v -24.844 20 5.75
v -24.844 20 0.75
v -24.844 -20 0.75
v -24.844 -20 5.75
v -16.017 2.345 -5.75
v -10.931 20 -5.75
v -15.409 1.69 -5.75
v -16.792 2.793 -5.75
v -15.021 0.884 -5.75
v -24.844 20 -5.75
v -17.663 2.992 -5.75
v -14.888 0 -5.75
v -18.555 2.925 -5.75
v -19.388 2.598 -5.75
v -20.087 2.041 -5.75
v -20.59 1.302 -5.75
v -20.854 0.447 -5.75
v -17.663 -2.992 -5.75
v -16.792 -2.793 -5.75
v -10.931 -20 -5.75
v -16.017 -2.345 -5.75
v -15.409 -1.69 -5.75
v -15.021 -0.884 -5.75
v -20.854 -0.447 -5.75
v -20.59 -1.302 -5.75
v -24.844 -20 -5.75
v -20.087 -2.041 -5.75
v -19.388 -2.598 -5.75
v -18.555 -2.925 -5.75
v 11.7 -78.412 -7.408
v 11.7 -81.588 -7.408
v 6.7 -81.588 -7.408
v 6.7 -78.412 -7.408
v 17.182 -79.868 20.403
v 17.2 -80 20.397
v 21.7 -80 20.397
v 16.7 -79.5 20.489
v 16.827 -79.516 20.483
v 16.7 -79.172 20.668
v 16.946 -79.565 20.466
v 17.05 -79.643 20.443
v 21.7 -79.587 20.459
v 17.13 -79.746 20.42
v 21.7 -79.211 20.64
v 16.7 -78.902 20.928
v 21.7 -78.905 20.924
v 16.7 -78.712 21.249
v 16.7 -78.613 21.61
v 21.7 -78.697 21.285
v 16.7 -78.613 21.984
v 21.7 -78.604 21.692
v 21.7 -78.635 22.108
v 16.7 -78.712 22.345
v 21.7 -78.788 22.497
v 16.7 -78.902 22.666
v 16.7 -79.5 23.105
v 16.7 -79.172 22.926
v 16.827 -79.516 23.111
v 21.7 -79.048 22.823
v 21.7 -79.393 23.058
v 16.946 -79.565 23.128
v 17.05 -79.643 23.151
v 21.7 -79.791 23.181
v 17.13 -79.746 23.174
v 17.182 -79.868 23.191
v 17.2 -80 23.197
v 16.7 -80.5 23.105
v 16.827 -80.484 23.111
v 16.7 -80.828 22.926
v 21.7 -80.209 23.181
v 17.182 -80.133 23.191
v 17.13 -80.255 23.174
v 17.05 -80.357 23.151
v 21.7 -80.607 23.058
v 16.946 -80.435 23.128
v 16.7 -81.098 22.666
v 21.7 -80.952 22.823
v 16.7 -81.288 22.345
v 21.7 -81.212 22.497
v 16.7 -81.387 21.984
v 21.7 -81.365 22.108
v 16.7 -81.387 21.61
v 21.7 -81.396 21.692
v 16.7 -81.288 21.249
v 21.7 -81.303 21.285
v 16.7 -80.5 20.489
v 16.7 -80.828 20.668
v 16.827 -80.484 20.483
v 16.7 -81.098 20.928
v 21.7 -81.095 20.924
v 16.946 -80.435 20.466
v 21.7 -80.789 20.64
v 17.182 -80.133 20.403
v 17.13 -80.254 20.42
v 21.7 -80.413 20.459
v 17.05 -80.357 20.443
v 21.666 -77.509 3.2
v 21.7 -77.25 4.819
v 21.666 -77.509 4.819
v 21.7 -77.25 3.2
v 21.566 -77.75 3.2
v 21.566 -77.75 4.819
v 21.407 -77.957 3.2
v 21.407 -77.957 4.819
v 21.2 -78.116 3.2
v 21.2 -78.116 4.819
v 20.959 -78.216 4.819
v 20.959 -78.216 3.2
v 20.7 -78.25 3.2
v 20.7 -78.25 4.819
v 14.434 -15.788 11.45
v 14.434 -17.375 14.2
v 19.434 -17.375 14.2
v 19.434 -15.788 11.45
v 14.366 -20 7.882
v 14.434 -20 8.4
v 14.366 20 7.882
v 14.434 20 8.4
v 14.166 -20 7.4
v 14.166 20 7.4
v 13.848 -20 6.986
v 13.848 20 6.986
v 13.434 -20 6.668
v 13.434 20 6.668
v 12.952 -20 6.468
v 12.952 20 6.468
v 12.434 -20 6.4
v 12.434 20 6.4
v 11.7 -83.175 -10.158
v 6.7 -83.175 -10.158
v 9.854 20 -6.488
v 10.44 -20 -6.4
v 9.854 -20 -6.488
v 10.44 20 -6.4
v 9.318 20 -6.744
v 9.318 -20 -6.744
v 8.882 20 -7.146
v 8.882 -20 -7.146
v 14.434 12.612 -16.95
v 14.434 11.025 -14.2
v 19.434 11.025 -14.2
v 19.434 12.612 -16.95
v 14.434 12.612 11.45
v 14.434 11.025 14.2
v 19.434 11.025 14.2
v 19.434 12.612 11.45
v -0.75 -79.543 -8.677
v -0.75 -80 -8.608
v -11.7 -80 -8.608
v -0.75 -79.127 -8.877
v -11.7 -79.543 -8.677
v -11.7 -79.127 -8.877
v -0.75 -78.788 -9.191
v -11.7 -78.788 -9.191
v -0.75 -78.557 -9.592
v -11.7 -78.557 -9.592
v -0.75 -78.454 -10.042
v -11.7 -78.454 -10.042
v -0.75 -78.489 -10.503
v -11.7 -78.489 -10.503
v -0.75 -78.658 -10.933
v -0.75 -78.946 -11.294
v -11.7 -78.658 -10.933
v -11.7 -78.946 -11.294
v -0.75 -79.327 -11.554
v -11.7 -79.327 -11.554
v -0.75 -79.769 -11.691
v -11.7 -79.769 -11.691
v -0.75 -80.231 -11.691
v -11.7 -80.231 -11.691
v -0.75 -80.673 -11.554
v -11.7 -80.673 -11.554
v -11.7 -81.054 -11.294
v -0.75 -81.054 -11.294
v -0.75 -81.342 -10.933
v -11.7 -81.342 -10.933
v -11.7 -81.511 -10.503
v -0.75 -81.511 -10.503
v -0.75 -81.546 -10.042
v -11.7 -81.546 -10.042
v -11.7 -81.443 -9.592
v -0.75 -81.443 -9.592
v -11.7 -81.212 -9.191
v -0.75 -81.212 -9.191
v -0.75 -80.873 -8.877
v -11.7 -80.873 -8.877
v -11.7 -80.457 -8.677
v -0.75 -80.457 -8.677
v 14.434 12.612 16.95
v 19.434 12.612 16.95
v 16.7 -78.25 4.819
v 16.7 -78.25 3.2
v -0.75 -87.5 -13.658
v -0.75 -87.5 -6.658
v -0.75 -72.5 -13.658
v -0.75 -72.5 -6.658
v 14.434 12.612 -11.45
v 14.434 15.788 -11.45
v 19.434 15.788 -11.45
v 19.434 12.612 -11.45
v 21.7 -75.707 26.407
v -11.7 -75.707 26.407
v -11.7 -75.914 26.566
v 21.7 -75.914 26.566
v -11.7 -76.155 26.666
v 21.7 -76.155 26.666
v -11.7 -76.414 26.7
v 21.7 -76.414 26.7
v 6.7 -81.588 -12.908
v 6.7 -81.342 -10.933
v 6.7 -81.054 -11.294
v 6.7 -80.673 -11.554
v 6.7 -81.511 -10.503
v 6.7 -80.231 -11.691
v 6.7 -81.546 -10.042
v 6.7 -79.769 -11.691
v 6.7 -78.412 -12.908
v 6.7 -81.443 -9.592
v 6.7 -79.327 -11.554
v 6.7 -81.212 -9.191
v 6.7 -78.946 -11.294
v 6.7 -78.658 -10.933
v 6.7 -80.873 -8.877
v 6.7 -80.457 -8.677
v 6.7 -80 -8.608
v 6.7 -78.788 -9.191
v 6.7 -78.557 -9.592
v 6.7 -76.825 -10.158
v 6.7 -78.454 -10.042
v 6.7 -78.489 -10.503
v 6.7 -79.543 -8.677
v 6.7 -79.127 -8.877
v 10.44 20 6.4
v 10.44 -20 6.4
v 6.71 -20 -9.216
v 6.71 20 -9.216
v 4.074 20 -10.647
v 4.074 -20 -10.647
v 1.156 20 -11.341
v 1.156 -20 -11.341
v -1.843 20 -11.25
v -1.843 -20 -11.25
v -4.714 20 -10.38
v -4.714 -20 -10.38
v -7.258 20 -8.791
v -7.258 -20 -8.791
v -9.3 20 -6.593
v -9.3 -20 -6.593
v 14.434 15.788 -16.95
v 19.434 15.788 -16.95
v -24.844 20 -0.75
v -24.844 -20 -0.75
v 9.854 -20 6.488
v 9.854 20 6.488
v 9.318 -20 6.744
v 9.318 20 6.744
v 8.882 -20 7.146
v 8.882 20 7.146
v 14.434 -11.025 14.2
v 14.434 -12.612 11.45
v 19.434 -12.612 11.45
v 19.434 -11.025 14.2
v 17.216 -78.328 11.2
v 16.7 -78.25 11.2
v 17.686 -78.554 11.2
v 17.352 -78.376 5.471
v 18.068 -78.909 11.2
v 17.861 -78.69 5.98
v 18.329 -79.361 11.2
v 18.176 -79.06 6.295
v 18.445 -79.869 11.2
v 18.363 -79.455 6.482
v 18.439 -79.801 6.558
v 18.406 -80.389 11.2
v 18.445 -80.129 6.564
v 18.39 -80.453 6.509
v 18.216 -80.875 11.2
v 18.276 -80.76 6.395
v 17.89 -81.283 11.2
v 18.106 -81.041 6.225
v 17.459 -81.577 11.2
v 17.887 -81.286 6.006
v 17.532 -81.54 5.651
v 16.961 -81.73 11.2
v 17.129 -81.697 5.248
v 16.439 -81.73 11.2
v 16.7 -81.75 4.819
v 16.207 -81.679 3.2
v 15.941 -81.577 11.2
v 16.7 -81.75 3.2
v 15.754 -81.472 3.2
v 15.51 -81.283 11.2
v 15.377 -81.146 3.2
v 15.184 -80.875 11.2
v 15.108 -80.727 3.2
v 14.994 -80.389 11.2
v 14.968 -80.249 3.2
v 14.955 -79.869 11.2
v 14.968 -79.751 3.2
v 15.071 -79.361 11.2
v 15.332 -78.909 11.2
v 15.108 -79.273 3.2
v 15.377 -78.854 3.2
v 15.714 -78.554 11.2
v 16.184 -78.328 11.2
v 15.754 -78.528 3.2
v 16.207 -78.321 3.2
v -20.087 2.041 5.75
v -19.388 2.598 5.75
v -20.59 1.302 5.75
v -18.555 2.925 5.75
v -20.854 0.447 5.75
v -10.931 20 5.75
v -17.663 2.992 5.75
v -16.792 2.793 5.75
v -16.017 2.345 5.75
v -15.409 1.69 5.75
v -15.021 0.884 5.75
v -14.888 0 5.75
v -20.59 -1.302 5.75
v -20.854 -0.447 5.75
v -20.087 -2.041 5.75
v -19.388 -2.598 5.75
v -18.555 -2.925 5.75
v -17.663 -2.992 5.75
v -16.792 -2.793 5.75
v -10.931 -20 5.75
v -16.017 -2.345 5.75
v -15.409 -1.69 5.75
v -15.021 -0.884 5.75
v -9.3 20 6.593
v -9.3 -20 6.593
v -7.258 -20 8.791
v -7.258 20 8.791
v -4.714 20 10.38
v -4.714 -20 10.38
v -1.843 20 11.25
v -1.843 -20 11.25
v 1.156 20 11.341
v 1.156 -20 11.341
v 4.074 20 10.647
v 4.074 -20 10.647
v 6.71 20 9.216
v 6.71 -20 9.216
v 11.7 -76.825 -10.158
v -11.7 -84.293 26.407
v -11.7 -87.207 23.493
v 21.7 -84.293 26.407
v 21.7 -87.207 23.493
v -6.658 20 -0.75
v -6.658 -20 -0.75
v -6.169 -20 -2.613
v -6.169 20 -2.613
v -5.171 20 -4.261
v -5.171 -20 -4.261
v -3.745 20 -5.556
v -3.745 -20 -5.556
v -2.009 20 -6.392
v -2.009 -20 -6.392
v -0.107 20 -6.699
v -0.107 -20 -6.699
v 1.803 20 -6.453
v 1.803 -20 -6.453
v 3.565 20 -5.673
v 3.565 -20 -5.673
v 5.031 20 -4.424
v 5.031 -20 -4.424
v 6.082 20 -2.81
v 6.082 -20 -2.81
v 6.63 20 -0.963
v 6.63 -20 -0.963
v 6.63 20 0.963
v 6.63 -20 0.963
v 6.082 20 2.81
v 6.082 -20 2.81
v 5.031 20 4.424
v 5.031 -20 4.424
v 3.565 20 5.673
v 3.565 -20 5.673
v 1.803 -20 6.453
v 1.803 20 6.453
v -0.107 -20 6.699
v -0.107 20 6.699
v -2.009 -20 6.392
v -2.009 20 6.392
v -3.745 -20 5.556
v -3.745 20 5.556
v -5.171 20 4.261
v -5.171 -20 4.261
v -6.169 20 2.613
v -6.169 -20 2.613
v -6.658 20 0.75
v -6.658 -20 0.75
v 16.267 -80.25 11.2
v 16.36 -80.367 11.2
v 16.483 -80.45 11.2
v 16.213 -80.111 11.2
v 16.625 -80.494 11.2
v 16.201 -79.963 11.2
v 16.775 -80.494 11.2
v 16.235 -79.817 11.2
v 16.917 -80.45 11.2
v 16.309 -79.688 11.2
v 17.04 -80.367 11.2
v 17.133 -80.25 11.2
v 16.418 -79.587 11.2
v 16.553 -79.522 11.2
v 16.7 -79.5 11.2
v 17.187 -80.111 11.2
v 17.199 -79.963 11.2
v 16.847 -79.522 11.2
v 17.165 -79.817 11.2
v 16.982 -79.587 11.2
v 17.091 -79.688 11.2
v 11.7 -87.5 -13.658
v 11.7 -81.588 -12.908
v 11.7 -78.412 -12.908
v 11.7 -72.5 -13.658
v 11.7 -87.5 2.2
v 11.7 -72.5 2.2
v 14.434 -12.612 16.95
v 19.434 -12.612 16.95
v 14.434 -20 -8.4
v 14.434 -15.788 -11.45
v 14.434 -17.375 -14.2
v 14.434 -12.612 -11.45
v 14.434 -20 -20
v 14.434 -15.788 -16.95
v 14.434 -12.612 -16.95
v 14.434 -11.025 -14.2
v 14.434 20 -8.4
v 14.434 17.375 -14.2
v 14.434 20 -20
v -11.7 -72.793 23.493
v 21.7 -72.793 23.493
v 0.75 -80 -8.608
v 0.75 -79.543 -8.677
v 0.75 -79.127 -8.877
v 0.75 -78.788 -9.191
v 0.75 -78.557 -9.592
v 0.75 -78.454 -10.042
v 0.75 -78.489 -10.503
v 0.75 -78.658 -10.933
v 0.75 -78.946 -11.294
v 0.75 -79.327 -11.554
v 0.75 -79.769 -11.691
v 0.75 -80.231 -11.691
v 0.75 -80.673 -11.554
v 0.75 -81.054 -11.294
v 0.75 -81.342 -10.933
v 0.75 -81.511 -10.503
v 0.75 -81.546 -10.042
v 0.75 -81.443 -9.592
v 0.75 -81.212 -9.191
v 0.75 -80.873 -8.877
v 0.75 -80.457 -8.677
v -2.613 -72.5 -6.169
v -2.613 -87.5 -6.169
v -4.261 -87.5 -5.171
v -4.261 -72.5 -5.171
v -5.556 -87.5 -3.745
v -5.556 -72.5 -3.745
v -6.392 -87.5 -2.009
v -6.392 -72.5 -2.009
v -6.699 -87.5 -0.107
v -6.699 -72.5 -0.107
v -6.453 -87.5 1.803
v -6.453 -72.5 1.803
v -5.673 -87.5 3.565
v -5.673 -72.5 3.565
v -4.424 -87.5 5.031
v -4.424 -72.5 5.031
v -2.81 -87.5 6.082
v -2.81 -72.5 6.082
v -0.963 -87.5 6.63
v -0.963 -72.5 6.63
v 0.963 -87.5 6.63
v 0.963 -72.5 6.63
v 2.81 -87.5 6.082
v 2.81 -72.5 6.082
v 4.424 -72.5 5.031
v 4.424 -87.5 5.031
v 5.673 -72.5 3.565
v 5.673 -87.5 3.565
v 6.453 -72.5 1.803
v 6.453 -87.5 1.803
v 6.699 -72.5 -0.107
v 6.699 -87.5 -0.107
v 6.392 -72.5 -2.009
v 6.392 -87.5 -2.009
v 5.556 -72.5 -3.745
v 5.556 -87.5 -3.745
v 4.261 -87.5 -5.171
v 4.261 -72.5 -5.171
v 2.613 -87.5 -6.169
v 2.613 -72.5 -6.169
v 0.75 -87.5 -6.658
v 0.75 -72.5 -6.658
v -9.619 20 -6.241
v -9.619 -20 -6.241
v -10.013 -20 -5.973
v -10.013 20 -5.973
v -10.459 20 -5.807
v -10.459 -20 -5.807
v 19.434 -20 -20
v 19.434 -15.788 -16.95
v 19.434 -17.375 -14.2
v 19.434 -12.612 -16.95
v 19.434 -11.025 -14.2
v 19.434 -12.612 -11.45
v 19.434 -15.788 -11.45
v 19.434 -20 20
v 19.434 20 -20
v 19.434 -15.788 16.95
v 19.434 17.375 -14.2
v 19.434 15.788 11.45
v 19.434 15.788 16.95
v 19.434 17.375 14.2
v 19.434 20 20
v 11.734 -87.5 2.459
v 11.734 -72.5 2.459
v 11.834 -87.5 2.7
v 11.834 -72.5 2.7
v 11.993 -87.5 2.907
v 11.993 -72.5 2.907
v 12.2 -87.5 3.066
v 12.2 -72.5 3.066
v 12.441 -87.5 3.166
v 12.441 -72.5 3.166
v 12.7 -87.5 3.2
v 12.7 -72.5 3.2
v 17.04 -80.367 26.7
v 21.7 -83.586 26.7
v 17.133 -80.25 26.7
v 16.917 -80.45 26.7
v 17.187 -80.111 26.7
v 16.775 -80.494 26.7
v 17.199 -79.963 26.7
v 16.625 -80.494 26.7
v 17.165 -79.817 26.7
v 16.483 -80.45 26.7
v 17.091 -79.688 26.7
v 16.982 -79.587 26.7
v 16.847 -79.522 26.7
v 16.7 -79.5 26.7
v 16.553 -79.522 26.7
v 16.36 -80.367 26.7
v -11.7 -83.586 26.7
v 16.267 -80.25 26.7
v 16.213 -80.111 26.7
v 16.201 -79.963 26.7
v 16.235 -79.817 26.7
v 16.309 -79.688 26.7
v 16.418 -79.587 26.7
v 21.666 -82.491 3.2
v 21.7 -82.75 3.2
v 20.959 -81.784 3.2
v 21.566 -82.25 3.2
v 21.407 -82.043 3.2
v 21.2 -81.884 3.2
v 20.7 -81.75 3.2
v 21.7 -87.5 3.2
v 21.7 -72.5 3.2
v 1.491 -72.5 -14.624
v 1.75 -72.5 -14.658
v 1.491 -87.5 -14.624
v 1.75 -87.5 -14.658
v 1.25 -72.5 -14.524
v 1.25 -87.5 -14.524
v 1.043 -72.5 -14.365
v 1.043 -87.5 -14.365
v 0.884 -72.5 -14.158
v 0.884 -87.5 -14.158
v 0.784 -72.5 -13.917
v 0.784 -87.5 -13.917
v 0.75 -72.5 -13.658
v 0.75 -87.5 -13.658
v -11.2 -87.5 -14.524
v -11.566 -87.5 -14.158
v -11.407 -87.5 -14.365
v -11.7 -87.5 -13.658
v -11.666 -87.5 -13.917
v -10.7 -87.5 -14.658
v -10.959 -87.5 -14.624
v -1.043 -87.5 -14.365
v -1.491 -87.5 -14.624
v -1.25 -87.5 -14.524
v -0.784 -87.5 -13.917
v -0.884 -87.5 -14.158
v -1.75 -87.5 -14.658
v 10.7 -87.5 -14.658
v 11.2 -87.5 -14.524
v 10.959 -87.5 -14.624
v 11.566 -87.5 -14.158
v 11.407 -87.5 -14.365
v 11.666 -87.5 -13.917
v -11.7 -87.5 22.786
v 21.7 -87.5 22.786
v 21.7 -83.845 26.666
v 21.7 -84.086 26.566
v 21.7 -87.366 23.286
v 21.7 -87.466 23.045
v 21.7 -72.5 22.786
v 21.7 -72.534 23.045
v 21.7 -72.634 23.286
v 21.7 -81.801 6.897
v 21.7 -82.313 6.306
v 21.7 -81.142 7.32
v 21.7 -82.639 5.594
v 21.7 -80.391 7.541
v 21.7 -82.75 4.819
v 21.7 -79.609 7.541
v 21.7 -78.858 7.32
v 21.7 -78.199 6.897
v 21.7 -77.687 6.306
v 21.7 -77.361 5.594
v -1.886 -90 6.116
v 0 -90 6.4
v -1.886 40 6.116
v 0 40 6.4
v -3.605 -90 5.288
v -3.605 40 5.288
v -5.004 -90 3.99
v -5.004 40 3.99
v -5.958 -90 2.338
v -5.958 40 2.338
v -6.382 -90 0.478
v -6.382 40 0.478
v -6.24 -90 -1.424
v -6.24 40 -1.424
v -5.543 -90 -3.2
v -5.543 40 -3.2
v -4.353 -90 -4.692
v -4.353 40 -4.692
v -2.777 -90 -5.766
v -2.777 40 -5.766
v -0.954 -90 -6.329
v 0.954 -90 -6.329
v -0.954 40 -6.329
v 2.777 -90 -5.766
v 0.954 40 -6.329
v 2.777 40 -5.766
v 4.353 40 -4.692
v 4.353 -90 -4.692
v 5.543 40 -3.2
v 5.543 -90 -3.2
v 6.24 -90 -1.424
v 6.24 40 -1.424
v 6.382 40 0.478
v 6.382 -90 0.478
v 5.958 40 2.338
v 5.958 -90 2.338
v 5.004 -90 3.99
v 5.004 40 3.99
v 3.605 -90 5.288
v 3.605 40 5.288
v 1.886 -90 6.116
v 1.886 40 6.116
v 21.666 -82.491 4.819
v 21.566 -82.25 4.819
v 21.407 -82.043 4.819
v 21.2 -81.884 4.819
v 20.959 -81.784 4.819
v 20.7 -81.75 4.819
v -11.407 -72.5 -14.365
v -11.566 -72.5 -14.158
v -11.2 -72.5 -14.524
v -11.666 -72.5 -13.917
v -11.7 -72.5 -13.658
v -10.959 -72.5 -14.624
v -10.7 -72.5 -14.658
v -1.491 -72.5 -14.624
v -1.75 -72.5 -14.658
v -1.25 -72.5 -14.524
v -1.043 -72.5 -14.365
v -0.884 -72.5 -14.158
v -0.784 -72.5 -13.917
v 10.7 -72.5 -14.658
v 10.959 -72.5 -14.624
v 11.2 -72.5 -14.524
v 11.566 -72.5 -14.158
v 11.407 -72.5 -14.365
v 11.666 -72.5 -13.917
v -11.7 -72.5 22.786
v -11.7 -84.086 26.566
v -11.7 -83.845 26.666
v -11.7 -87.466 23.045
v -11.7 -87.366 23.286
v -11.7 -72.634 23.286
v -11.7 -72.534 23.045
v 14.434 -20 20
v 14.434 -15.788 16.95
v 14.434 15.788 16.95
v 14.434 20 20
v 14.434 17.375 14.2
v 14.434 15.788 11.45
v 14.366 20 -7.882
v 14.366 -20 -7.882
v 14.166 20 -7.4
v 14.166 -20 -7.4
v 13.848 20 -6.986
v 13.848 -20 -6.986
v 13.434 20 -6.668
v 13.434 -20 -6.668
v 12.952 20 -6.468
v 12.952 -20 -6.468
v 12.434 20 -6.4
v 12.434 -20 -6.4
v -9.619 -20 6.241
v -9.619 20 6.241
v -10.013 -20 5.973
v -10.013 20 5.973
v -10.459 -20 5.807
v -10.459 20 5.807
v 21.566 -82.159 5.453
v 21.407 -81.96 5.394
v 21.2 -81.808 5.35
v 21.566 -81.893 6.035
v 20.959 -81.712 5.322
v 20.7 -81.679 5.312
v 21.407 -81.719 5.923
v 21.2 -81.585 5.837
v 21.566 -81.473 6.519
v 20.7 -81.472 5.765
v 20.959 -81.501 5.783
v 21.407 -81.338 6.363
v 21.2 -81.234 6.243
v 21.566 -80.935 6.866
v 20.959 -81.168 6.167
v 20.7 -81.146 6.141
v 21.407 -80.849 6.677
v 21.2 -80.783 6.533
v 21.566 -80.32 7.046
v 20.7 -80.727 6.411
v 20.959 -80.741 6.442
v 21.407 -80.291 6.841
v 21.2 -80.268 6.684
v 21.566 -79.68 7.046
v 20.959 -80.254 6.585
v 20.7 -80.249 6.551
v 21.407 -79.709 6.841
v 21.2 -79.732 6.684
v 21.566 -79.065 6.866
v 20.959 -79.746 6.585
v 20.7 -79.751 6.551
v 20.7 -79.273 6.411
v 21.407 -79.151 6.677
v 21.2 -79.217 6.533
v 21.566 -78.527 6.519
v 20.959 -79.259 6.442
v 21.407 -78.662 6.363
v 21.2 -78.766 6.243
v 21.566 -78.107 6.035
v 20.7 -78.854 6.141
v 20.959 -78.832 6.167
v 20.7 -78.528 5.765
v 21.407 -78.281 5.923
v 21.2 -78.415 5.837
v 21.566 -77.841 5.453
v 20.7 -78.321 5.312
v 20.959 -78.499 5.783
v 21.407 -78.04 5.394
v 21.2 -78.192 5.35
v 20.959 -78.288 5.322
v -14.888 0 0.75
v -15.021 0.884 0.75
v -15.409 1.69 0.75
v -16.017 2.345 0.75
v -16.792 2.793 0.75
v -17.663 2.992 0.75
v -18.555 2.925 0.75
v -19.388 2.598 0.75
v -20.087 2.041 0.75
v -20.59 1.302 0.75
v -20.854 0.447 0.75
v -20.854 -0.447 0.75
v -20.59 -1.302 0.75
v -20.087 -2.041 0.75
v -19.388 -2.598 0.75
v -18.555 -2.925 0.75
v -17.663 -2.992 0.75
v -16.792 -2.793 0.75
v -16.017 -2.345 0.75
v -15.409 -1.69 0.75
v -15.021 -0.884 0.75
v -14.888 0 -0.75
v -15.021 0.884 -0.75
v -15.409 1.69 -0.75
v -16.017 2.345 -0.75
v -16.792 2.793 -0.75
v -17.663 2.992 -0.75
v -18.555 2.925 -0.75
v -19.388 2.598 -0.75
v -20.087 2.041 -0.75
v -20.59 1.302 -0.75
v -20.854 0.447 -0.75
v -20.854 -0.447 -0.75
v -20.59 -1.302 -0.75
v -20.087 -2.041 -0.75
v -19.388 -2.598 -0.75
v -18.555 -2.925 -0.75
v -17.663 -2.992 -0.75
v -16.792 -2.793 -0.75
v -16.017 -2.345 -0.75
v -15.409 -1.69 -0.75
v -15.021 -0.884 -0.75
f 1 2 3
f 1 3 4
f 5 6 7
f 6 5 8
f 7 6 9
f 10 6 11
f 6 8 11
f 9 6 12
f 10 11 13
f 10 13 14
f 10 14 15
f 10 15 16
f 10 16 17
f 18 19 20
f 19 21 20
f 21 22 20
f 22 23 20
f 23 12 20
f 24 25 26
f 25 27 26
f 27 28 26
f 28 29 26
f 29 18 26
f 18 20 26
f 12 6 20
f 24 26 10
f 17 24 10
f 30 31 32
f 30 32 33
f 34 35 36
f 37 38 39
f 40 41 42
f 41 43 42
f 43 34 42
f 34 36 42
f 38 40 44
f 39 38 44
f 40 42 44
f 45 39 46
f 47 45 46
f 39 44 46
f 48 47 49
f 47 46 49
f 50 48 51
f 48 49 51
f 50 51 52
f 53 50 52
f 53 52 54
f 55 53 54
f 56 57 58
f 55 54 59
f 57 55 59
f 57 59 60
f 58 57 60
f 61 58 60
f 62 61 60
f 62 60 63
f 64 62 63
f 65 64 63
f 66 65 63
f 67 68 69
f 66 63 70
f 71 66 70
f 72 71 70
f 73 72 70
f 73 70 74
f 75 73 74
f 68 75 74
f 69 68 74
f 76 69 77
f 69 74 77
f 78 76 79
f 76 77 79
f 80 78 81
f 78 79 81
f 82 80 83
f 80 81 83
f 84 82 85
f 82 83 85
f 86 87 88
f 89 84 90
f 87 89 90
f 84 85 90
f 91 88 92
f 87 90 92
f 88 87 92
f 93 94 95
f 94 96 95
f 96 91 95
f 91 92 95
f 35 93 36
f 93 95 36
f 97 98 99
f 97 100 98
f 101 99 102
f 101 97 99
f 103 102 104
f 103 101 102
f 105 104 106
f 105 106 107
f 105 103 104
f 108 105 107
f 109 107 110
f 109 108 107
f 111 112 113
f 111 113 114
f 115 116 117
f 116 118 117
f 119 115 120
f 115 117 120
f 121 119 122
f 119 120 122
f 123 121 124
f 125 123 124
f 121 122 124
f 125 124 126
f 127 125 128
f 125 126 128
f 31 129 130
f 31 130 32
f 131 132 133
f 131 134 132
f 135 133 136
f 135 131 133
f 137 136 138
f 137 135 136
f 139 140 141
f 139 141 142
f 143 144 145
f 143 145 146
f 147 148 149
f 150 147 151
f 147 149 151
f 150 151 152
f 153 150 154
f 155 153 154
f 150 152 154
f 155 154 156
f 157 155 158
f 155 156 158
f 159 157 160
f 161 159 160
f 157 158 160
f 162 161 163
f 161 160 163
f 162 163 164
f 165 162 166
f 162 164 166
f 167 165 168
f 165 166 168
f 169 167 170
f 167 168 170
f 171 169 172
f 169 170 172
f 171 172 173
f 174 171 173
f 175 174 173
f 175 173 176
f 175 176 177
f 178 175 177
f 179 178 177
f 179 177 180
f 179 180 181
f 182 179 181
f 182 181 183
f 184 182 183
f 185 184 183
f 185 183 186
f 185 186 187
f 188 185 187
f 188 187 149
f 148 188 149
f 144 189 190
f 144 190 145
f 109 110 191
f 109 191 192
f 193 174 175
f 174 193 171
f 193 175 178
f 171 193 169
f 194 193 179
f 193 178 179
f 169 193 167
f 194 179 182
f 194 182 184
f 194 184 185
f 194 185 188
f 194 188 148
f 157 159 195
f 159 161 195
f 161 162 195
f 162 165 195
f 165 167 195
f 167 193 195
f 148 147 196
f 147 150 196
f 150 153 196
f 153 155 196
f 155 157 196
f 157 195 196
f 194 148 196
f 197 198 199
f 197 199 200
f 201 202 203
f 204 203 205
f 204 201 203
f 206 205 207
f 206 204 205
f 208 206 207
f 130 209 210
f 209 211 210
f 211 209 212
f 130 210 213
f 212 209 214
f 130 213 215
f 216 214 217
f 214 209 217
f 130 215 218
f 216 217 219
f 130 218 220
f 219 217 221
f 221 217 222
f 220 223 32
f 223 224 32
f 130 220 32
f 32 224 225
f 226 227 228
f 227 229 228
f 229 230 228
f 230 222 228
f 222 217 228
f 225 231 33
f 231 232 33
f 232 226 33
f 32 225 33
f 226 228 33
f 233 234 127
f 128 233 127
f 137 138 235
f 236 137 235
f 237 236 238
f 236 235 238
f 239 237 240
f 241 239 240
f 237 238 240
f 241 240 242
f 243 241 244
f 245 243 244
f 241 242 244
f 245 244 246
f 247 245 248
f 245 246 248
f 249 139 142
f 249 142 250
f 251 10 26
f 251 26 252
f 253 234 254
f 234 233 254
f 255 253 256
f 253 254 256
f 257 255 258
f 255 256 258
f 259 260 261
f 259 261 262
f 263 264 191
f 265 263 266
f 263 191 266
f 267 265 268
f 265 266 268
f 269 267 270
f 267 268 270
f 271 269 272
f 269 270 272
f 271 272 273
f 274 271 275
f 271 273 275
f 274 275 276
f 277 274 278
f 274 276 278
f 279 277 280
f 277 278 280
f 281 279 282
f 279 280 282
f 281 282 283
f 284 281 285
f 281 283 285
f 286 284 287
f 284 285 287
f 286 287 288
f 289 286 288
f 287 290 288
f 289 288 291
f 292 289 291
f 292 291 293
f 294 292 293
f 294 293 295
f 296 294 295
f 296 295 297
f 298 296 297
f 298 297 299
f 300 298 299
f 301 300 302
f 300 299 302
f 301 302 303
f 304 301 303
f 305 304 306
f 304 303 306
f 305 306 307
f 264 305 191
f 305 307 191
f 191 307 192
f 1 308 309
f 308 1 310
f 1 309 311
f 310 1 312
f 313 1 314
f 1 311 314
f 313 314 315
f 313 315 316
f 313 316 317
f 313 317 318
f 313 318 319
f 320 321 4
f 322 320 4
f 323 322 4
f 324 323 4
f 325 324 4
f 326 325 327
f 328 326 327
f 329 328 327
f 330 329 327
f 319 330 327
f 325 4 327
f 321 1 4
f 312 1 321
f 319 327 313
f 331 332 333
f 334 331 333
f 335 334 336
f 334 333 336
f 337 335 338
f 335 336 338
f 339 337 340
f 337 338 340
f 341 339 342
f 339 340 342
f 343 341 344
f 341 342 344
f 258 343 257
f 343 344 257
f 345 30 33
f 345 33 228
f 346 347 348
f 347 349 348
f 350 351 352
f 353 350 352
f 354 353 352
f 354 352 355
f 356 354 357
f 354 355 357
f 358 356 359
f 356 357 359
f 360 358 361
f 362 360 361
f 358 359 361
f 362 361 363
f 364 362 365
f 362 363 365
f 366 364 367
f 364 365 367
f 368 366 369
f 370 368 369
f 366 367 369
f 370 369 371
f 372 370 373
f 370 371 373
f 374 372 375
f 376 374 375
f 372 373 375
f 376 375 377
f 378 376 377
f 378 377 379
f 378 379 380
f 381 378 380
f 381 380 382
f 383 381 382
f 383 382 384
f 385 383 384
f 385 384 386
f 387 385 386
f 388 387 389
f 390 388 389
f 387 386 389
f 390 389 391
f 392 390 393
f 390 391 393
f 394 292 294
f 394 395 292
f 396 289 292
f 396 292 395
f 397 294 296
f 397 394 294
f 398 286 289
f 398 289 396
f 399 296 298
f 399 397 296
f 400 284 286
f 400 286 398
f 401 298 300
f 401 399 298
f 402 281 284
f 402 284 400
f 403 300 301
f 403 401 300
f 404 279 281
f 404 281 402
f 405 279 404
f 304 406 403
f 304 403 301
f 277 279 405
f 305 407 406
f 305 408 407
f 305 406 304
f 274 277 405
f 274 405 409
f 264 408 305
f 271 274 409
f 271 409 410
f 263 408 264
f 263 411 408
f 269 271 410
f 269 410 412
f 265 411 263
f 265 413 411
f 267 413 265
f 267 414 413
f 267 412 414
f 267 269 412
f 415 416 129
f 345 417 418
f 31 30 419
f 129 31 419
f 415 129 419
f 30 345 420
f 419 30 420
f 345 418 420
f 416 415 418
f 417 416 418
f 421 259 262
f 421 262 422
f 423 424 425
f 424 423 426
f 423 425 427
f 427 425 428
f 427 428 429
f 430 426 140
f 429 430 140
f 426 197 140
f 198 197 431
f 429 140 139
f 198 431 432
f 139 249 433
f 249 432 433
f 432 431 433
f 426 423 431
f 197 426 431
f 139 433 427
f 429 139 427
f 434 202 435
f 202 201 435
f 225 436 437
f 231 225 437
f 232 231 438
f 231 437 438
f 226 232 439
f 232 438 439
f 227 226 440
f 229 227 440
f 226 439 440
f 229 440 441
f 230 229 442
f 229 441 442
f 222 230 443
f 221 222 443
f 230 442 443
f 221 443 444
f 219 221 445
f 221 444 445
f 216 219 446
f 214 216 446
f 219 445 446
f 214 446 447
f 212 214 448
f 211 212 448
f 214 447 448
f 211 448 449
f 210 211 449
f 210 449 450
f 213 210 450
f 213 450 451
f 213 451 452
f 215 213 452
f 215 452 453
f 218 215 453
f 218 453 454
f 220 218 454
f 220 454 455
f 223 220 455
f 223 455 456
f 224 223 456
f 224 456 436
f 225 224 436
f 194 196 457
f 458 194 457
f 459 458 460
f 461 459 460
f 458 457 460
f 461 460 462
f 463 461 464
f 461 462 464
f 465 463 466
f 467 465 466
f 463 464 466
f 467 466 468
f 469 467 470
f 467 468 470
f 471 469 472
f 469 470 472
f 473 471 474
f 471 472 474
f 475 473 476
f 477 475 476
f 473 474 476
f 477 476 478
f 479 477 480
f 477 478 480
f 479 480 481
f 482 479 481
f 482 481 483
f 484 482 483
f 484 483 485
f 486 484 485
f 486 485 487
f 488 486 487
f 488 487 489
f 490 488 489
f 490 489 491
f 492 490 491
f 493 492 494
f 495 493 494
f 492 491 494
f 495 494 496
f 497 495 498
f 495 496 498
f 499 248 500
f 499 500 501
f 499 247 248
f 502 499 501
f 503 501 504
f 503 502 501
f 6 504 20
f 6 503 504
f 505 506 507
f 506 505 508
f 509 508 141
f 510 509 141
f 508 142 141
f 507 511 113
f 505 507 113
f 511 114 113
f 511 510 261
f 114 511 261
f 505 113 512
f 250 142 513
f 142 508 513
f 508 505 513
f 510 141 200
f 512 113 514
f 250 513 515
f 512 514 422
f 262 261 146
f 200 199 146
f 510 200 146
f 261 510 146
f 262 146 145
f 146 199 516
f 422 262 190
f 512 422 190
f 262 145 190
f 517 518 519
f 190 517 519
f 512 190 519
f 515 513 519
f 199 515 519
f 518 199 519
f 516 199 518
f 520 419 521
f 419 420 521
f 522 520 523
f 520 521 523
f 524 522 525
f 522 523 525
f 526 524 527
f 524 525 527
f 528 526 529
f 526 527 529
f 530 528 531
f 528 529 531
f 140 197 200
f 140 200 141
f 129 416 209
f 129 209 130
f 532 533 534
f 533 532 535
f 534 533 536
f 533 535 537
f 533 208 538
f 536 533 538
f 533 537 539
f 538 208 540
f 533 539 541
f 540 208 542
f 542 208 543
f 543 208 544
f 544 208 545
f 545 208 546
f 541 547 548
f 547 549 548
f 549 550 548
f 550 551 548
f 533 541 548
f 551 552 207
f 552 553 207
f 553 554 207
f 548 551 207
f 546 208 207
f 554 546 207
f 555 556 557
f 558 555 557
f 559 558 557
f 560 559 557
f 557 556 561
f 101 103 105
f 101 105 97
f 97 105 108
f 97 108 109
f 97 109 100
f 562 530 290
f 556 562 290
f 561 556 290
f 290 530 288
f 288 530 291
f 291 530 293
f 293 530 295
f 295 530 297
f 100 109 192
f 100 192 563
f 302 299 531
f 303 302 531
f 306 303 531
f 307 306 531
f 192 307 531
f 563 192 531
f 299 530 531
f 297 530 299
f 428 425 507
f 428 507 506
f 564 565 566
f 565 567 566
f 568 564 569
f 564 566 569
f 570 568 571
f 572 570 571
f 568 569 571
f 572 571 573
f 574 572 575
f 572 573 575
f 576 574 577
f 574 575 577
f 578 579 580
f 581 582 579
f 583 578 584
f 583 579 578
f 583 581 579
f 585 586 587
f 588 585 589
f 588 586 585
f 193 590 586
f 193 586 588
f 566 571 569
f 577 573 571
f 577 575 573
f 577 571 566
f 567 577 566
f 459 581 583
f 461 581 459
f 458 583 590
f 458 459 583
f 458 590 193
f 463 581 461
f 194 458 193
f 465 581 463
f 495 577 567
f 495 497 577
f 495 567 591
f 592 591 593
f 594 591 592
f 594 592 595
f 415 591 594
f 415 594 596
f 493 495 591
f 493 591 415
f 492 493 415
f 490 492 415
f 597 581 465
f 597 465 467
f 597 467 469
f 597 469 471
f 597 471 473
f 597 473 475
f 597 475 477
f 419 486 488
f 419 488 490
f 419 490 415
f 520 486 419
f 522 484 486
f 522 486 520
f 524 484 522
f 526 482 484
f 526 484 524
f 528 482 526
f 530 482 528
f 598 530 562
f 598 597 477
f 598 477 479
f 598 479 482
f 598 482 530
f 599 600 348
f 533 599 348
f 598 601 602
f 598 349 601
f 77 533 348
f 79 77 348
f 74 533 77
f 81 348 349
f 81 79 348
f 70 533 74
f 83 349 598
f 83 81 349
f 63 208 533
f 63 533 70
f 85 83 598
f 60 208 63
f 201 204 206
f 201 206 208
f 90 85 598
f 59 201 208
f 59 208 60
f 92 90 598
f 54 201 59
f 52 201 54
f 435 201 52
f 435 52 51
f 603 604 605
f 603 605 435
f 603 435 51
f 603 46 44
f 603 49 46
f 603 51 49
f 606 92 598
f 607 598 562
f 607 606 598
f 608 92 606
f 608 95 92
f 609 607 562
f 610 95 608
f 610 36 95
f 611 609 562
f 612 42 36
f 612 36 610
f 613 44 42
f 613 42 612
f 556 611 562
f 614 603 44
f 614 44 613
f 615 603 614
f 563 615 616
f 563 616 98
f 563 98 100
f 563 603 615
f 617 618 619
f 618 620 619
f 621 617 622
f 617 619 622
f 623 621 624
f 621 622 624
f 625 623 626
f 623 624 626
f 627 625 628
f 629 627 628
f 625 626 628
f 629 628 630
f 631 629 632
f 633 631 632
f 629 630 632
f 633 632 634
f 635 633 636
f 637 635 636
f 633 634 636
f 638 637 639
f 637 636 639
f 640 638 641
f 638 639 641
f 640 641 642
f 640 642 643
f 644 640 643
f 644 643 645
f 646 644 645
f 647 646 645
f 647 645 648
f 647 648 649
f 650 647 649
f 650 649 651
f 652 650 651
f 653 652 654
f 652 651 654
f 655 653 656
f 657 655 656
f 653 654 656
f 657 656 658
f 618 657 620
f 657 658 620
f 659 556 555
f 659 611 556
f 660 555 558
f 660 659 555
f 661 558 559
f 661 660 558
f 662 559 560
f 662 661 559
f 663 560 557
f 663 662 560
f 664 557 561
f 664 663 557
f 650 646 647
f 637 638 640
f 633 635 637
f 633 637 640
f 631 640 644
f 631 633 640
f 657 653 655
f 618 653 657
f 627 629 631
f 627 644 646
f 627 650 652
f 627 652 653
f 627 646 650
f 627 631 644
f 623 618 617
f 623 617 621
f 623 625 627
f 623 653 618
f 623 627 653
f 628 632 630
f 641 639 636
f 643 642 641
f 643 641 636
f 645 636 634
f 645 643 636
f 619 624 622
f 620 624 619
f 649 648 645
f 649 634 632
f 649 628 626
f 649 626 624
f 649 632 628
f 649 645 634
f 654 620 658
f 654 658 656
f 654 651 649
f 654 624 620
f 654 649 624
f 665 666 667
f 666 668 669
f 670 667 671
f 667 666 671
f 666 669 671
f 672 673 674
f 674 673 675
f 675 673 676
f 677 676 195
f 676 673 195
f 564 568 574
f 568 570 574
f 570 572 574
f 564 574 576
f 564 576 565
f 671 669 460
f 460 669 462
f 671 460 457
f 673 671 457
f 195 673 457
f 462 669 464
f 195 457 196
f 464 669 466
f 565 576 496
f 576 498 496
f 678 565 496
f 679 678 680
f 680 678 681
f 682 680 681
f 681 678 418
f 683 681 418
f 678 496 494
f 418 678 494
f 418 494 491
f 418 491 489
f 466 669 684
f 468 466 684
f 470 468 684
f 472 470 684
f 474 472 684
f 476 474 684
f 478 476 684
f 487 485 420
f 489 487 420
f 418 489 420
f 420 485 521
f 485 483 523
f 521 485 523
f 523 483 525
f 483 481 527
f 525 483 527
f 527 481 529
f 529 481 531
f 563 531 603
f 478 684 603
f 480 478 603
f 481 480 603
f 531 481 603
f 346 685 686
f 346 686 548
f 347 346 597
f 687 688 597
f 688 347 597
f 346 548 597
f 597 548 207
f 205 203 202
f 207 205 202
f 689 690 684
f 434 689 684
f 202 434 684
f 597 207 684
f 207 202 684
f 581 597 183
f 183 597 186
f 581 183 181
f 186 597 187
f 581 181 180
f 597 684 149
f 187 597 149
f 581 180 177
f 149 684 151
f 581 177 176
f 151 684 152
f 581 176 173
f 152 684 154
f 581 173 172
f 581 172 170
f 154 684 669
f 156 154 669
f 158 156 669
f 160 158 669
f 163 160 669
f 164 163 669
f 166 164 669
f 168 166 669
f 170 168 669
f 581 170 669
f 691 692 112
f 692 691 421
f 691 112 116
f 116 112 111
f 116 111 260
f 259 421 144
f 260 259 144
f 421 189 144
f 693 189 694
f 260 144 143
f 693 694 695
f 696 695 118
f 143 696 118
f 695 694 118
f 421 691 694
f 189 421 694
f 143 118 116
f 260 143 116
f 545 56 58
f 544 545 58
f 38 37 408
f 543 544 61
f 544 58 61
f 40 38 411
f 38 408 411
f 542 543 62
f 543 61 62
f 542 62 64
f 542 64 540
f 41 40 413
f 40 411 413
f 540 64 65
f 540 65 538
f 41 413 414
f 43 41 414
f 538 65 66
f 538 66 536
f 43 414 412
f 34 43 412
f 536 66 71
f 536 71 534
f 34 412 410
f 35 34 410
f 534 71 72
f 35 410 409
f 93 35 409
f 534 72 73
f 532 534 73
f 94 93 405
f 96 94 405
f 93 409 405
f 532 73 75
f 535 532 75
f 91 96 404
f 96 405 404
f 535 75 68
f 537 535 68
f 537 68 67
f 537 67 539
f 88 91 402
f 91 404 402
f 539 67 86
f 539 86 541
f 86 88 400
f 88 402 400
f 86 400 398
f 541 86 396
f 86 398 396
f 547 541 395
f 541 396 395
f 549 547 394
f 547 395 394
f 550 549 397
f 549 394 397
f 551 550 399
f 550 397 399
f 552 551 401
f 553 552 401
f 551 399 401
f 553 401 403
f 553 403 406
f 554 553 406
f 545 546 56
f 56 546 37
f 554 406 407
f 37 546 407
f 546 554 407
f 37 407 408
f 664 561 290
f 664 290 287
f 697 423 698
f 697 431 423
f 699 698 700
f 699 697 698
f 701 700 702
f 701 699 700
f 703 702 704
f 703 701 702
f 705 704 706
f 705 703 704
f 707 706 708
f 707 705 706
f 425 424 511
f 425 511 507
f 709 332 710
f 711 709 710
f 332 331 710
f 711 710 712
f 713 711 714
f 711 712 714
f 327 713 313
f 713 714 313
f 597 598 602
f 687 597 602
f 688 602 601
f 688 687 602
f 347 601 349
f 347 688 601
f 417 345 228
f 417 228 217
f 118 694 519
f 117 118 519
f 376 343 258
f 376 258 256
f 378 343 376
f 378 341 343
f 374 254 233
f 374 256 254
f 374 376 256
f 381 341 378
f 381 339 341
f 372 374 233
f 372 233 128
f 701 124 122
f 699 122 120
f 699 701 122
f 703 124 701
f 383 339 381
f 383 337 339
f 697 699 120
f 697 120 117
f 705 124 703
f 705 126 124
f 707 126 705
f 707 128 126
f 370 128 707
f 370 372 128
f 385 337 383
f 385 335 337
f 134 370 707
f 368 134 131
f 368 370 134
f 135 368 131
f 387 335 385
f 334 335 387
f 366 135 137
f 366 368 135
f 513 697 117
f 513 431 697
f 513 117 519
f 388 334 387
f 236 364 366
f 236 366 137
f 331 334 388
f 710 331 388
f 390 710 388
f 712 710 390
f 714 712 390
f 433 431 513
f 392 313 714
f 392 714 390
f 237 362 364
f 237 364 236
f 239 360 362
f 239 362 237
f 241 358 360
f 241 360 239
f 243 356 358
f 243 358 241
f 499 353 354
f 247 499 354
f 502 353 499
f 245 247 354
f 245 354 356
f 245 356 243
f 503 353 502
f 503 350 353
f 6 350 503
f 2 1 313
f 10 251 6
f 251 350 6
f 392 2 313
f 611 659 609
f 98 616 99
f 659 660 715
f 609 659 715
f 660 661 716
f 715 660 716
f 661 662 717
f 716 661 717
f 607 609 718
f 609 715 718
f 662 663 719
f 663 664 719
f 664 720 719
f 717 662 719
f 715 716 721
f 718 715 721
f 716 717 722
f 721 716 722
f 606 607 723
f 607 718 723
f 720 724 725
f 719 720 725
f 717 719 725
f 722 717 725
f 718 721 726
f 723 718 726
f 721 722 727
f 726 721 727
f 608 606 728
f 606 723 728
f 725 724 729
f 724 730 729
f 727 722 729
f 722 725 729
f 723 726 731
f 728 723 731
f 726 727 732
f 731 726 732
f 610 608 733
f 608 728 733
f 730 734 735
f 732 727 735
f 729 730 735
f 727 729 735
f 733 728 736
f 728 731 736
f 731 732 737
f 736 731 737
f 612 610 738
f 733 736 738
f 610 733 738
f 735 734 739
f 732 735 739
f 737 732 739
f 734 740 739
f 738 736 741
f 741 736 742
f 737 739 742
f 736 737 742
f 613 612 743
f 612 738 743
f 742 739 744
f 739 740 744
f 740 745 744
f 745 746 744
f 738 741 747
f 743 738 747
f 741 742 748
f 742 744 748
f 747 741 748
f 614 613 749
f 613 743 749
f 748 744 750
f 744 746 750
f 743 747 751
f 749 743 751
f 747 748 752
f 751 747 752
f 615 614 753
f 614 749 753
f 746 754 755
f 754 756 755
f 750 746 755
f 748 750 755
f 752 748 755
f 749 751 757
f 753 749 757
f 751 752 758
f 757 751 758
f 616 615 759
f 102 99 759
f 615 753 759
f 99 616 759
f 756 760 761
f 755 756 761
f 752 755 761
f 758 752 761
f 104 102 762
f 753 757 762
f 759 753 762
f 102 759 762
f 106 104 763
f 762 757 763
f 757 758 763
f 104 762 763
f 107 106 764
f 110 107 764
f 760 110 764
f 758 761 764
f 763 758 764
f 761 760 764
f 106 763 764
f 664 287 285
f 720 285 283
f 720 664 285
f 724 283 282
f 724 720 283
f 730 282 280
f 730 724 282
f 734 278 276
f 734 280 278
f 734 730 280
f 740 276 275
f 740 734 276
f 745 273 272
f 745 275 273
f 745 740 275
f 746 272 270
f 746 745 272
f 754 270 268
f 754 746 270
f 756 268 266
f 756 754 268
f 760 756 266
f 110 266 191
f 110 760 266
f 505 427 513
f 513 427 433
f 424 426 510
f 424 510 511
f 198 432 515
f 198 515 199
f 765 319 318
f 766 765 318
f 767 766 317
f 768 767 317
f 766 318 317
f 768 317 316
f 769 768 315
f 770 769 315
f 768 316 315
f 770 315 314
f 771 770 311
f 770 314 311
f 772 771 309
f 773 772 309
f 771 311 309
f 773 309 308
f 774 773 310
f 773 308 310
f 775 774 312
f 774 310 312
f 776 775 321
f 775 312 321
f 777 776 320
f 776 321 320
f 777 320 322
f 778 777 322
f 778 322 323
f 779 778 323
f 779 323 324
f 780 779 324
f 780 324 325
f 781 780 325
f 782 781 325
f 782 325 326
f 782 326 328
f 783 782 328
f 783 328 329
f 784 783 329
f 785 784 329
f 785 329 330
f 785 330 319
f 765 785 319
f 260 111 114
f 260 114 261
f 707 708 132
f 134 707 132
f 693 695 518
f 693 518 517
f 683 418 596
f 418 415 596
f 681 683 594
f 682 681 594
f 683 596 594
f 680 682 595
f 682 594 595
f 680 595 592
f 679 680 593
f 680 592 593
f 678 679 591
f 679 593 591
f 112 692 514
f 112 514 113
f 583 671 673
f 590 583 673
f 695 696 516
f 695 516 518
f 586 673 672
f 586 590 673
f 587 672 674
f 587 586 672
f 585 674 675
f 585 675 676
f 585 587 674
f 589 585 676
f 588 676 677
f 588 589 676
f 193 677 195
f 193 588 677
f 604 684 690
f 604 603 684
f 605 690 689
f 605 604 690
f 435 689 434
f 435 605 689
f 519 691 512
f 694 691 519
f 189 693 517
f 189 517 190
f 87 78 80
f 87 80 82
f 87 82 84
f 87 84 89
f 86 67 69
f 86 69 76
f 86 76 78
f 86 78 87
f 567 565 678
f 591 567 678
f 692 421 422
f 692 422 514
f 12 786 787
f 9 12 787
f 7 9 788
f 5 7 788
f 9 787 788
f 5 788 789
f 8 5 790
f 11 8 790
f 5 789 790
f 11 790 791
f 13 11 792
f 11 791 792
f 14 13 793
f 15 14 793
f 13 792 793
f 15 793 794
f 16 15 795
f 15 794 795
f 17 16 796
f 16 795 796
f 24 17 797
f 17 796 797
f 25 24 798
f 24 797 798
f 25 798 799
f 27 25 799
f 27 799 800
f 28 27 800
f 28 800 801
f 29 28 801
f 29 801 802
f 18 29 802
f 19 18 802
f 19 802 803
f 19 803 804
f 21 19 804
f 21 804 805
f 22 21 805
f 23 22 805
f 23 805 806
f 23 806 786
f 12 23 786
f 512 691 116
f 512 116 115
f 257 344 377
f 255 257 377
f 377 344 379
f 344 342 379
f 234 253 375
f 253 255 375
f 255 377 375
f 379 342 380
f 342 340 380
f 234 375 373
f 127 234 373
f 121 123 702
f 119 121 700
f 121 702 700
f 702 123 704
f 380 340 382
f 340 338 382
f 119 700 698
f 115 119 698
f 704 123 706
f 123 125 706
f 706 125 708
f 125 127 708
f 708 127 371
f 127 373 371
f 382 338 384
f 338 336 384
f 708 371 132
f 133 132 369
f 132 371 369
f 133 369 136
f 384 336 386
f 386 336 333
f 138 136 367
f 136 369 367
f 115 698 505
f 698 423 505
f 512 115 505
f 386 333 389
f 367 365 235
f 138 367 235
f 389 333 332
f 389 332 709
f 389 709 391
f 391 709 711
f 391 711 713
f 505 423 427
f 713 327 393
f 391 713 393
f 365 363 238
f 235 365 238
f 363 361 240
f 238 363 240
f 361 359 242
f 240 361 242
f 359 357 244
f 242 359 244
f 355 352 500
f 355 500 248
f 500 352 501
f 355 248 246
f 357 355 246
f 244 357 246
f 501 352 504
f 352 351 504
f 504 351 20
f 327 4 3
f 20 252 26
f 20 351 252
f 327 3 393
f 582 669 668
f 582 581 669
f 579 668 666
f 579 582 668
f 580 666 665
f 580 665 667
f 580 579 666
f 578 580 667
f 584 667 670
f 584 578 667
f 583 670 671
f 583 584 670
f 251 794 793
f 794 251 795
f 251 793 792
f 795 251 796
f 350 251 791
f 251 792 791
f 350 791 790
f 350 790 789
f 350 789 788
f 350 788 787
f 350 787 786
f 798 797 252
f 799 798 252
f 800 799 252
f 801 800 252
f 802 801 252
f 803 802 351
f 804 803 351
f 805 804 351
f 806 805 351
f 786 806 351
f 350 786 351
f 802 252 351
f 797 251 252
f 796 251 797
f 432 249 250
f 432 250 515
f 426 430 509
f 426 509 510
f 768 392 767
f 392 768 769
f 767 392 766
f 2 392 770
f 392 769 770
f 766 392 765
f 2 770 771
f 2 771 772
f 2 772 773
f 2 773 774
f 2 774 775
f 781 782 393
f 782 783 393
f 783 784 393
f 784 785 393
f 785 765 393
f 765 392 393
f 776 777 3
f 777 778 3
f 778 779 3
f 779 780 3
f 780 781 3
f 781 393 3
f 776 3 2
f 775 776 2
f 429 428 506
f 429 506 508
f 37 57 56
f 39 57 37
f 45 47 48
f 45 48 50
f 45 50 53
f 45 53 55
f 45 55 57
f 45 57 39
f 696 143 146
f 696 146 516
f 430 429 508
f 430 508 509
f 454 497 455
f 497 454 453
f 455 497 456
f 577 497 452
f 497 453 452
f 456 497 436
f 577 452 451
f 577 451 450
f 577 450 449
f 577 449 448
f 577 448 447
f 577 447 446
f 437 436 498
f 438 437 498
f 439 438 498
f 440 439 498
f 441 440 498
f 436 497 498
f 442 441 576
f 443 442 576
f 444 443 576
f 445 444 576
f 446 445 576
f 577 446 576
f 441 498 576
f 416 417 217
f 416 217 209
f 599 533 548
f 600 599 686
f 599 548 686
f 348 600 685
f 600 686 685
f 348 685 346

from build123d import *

# Parameters (mm, degrees)
BOSS_EXTRUDE1_DEPTH      = 40
BOSS_EXTRUDE1_DEPTH_BACK = 80
SKETCH1_R                = 6.4
BOSS_EXTRUDE2_DEPTH      = 20
BOSS_EXTRUDE2_DEPTH_BACK = 20
SKETCH6_W                = 40
SKETCH6_H                = 40
BOSS_EXTRUDE6_DEPTH      = 10
BOSS_EXTRUDE7_DEPTH      = 20
BOSS_EXTRUDE7_DEPTH_BACK = 20
FILLET4_R                = 2
FILLET5_R                = 2
CUT_EXTRUDE1_REACH       = 107.462
SKETCH9_R                = 3
CUT_EXTRUDE2_REACH       = 101.861
SKETCH10_R               = 2.5
BOSS_EXTRUDE8_DEPTH      = 7.5
BOSS_EXTRUDE8_DEPTH_BACK = 7.5
FILLET6_R                = 1
FILLET7_R                = 1
CUT_EXTRUDE8_REACH       = 120.558
SKETCH17_R               = 1.55
CUT_EXTRUDE9_DEPTH       = 5
SKETCH19_R               = 6.4
BOSS_EXTRUDE9_DEPTH      = 10
BOSS_EXTRUDE11_DEPTH     = 10
CUT_EXTRUDE15_DEPTH      = 23.4
SKETCH29_R               = 0.5
CUT_EXTRUDE16_DEPTH      = 23.5
SKETCH30_R               = 1.75
CUT_EXTRUDE17_DEPTH      = 8
FILLET10_R               = 1
SKETCH31_R               = 1.4
CUT_EXTRUDE18_DEPTH      = 5
CUT_EXTRUDE19_DEPTH      = 5
FILLET11_R               = 1
SKETCH33_R               = 1.5
CUT_EXTRUDE20_DEPTH      = 10
CUT_EXTRUDE21_DEPTH      = 5
SKETCH35_W               = 76.564023034
SKETCH35_H               = 53.794597286
CUT_EXTRUDE22_DEPTH      = 68


with BuildPart() as part:
    # Sketch1 → Boss-Extrude1 (new, two sides: drawn at the far end of the back side and taken through both)
    with BuildSketch(Plane(origin=(0, 0, 0), x_dir=(1, 0, 0), z_dir=(0, 1, 0)).offset(-BOSS_EXTRUDE1_DEPTH_BACK)):
        with Locations(Location((0, 0, 0), (0, 0, 270))):
            Circle(SKETCH1_R)
    extrude(amount=BOSS_EXTRUDE1_DEPTH + BOSS_EXTRUDE1_DEPTH_BACK)

    # Sketch19 → Boss-Extrude9 (add)
    with BuildSketch(Plane(origin=(0, -80, 0), x_dir=(-1, 0, 0), z_dir=(0, -1, 0))):
        with Locations(Location((0, 0, 0), (0, 0, 270))):
            Circle(SKETCH19_R)
    extrude(amount=BOSS_EXTRUDE9_DEPTH)


with BuildPart() as body_2:
    # Sketch2 → Boss-Extrude2 (new, two sides: drawn at the far end of the back side and taken through both)
    with BuildSketch(Plane(origin=(0, 0, 0), x_dir=(1, 0, 0), z_dir=(0, 1, 0)).offset(-BOSS_EXTRUDE2_DEPTH_BACK)):
        with BuildLine():
            Line((-9.843652777, 5.75), (-24.843652777, 5.75))
            Line((-24.843652777, 5.75), (-24.843652777, 0.75))
            Line((-24.843652777, 0.75), (-6.657890056, 0.75))
            ThreePointArc((-6.657890056, 0.75), (6.7, 0), (-6.657890056, -0.75))
            Line((-6.657890056, -0.75), (-24.843652777, -0.75))
            Line((-24.843652777, -0.75), (-24.843652777, -5.75))
            Line((-24.843652777, -5.75), (-9.843652777, -5.75))
            ThreePointArc((-9.843652777, -5.75), (-0.384164957, -11.393525235), (9.433981132, -6.4))
            Line((9.433981132, -6.4), (14.433981132, -6.4))
            Line((14.433981132, -6.4), (14.433981132, 6.4))
            Line((14.433981132, 6.4), (9.433981132, 6.4))
            ThreePointArc((9.433981132, 6.4), (-0.384164957, 11.393525235), (-9.843652777, 5.75))
        make_face()
    extrude(amount=BOSS_EXTRUDE2_DEPTH + BOSS_EXTRUDE2_DEPTH_BACK)

    # Sketch6 → Boss-Extrude6 (add)
    with BuildSketch(Plane(origin=(14.433981132, 0, 0), x_dir=(0, 0, -1), z_dir=(1, 0, 0))):
        Rectangle(SKETCH6_W, SKETCH6_H)
    extrude(amount=BOSS_EXTRUDE6_DEPTH)

    # Sketch7 → Boss-Extrude7 (add, two sides: drawn at the far end of the back side and taken through both)
    with BuildSketch(Plane(origin=(0, 0, 0), x_dir=(-1, 0, 0), z_dir=(0, 0, -1)).offset(-BOSS_EXTRUDE7_DEPTH_BACK)):
        with BuildLine():
            Line((-24.433981132, -6.4), (-29.433981132, -6.4))
            ThreePointArc((-29.433981132, -6.4), (-39.252127221, -11.393525235), (-48.711615041, -5.75))
            Line((-48.711615041, -5.75), (-63.711615041, -5.75))
            Line((-63.711615041, -5.75), (-63.711615041, -0.75))
            Line((-63.711615041, -0.75), (-45.52585232, -0.75))
            ThreePointArc((-45.52585232, -0.75), (-32.167962264, 0), (-45.52585232, 0.75))
            Line((-45.52585232, 0.75), (-63.711615041, 0.75))
            Line((-63.711615041, 0.75), (-63.711615041, 5.75))
            Line((-63.711615041, 5.75), (-48.711615041, 5.75))
            ThreePointArc((-48.711615041, 5.75), (-39.252127221, 11.393525235), (-29.433981132, 6.4))
            Line((-29.433981132, 6.4), (-24.433981132, 6.4))
            Line((-24.433981132, 6.4), (-24.433981132, -6.4))
        make_face()
    extrude(amount=BOSS_EXTRUDE7_DEPTH + BOSS_EXTRUDE7_DEPTH_BACK)

    # Fillet4
    fillet4_edges = [body_2.edges().sort_by_distance(p)[0] for p in [
        (24.433981132, 6.4, 0),
        (24.433981132, -6.4, 0),
        (14.433981132, 0, -6.4),
        (14.433981132, 0, 6.4),
    ]]
    fillet(fillet4_edges, radius=FILLET4_R)

    # Fillet5
    fillet5_edges = [body_2.edges().sort_by_distance(p)[0] for p in [
        (29.433981132, -6.4, 0),
        (29.433981132, 6.4, 0),
        (48.711615041, 5.75, 0),
        (48.711615041, -5.75, 0),
        (9.433981132, 0, 6.4),
        (9.433981132, 0, -6.4),
        (-9.843652777, 0, -5.75),
        (-9.843652777, 0, 5.75),
    ]]
    fillet(fillet5_edges, radius=FILLET5_R)

    # Cut-Extrude1: up to this face of the body (flat: up to its plane)
    cut_extrude1_end = Plane(body_2.part.faces().sort_by_distance((-17.887571992, 0, -5.75))[0])
    # Sketch9 → Cut-Extrude1 (cut, up to the picked face)
    with BuildSketch(Plane.XY.offset(5.75), mode=Mode.PRIVATE) as cut_extrude1_sk1:
        with Locations((-17.887571992, 0)):
            Circle(SKETCH9_R)
    cut_extrude1_tool1 = split(extrude(cut_extrude1_sk1.sketch, amount=-CUT_EXTRUDE1_REACH, mode=Mode.PRIVATE), bisect_by=cut_extrude1_end, keep=Keep.BOTH, mode=Mode.PRIVATE)
    add(cut_extrude1_tool1.solids().sort_by(Axis((-17.887572, 0, 5.75), (0, 0, -1)))[0], mode=Mode.SUBTRACT)

    # Cut-Extrude2: up to this face of the body (flat: up to its plane)
    cut_extrude2_end = Plane(body_2.part.faces().sort_by_distance((56.755534256, 5.75, 0))[0])
    # Sketch10 → Cut-Extrude2 (cut, up to the picked face)
    with BuildSketch(Plane(origin=(0, -5.75, 0), x_dir=(-1, 0, 0), z_dir=(0, -1, 0)), mode=Mode.PRIVATE) as cut_extrude2_sk1:
        with Locations(Location((-56.755534256, 0, 0), (0, 0, 180))):
            Circle(SKETCH10_R)
    cut_extrude2_tool1 = split(extrude(cut_extrude2_sk1.sketch, amount=-CUT_EXTRUDE2_REACH, mode=Mode.PRIVATE), bisect_by=cut_extrude2_end, keep=Keep.BOTH, mode=Mode.PRIVATE)
    add(cut_extrude2_tool1.solids().sort_by(Axis((56.755534, -5.75, 0), (0, 1, 0)))[0], mode=Mode.SUBTRACT)

    # Sketch33 → Cut-Extrude20 (cut)
    with BuildSketch(Plane.ZY.offset(-14.433981132)):
        with Locations((14.2, 14.2)):
            Circle(SKETCH33_R)
        with Locations(Location((14.2, -14.2, 0), (0, 0, 180))):
            Circle(SKETCH33_R)
        with Locations((-14.2, -14.2)):
            Circle(SKETCH33_R)
        with Locations(Location((-14.2, 14.2, 0), (0, 0, 180))):
            Circle(SKETCH33_R)
    extrude(amount=-CUT_EXTRUDE20_DEPTH, mode=Mode.SUBTRACT)

    # Sketch34 → Cut-Extrude21 (cut)
    with BuildSketch(Plane.ZY.offset(-14.433981132)):
        Polygon((16.95, -12.61228676), (16.95, -15.78771324), (14.2, -17.375426481), (11.45, -15.78771324), (11.45, -12.61228676), (14.2, -11.024573519), align=None)
        Polygon((14.2, 17.375426481), (16.95, 15.78771324), (16.95, 12.61228676), (14.2, 11.024573519), (11.45, 12.61228676), (11.45, 15.78771324), align=None)
        Polygon((-14.2, -17.375426481), (-16.95, -15.78771324), (-16.95, -12.61228676), (-14.2, -11.024573519), (-11.45, -12.61228676), (-11.45, -15.78771324), align=None)
        Polygon((-16.95, 12.61228676), (-16.95, 15.78771324), (-14.2, 17.375426481), (-11.45, 15.78771324), (-11.45, 12.61228676), (-14.2, 11.024573519), align=None)
    extrude(amount=-CUT_EXTRUDE21_DEPTH, mode=Mode.SUBTRACT)

    # Sketch35 → Cut-Extrude22 (cut)
    with BuildSketch(Plane.ZY.offset(-19.433981132)):
        Rectangle(SKETCH35_W, SKETCH35_H)
    extrude(amount=-CUT_EXTRUDE22_DEPTH, mode=Mode.SUBTRACT)


with BuildPart() as body_3:
    # Sketch13 → Boss-Extrude8 (new, two sides: drawn at the far end of the back side and taken through both)
    with BuildSketch(Plane.XZ.offset(80).offset(-BOSS_EXTRUDE8_DEPTH_BACK)):
        with BuildLine():
            Line((11.7, -14.657890056), (11.7, 26.7))
            Line((11.7, 26.7), (-11.7, 26.7))
            Line((-11.7, 26.7), (-11.7, -14.657890056))
            Line((-11.7, -14.657890056), (-0.75, -14.657890056))
            Line((-0.75, -14.657890056), (-0.75, -6.657890056))
            ThreePointArc((-0.75, -6.657890056), (0, 6.7), (0.75, -6.657890056))
            Line((0.75, -6.657890056), (0.75, -14.657890056))
            Line((0.75, -14.657890056), (11.7, -14.657890056))
        make_face()
    extrude(amount=BOSS_EXTRUDE8_DEPTH + BOSS_EXTRUDE8_DEPTH_BACK)

    # Fillet6
    fillet6_edges = [body_3.edges().sort_by_distance(p)[0] for p in [
        (-11.7, -80, -14.657890056),
        (11.7, -80, -14.657890056),
    ]]
    fillet(fillet6_edges, radius=FILLET6_R)

    # Fillet7
    fillet7_edges = [body_3.edges().sort_by_distance(p)[0] for p in [
        (0.75, -80, -14.657890056),
        (-0.75, -80, -14.657890056),
    ]]
    fillet(fillet7_edges, radius=FILLET7_R)

    # Cut-Extrude8: up to this face of the body (flat: up to its plane)
    cut_extrude8_end = Plane(body_3.part.faces().sort_by_distance((11.7, -80, 6.521054972))[0])
    # Sketch17 → Cut-Extrude8 (cut, up to the picked face)
    with BuildSketch(Plane.ZY.offset(11.7), mode=Mode.PRIVATE) as cut_extrude8_sk1:
        with Locations((-10.157890056, -80)):
            Circle(SKETCH17_R)
    cut_extrude8_tool1 = split(extrude(cut_extrude8_sk1.sketch, amount=-CUT_EXTRUDE8_REACH, mode=Mode.PRIVATE), bisect_by=cut_extrude8_end, keep=Keep.BOTH, mode=Mode.PRIVATE)
    add(cut_extrude8_tool1.solids().sort_by(Axis((-11.7, -80, -10.15789), (1, 0, 0)))[0], mode=Mode.SUBTRACT)

    # Sketch18 → Cut-Extrude9 (cut)
    with BuildSketch(Plane(origin=(11.7, 0, 0), x_dir=(0, 0, -1), z_dir=(1, 0, 0))):
        Polygon((12.907890056, -78.41228676), (12.907890056, -81.58771324), (10.157890056, -83.175426481), (7.407890056, -81.58771324), (7.407890056, -78.41228676), (10.157890056, -76.824573519), align=None)
    extrude(amount=-CUT_EXTRUDE9_DEPTH, mode=Mode.SUBTRACT)

    # Sketch27 → Boss-Extrude11 (add)
    with BuildSketch(Plane(origin=(11.7, 0, 0), x_dir=(0, 0, -1), z_dir=(1, 0, 0))):
        Polygon((-23.2, -72.5), (-26.7, -76), (-26.7, -84), (-23.2, -87.5), (-3.2, -87.5), (-3.2, -72.5), align=None)
    extrude(amount=BOSS_EXTRUDE11_DEPTH)

    # Sketch28 → Cut-Extrude15 (cut)
    with BuildSketch(Plane(origin=(11.7, 0, 0), x_dir=(0, 0, -1), z_dir=(1, 0, 0))):
        Polygon((-26.7, -72.5), (-26.7, -76), (-23.2, -72.5), align=None)
        Polygon((-26.7, -87.5), (-23.2, -87.5), (-26.7, -84), align=None)
    extrude(amount=-CUT_EXTRUDE15_DEPTH, mode=Mode.SUBTRACT)

    # Sketch29 → Cut-Extrude16 (cut)
    with BuildSketch(Plane(origin=(0, 0, 3.2), x_dir=(-1, 0, 0), z_dir=(0, 0, -1))):
        with Locations(Location((-16.7, -80, 0), (0, 0, 90))):
            Circle(SKETCH29_R)
    extrude(amount=-CUT_EXTRUDE16_DEPTH, mode=Mode.SUBTRACT)

    # Sketch30 → Cut-Extrude17 (cut)
    with BuildSketch(Plane(origin=(0, 0, 3.2), x_dir=(-1, 0, 0), z_dir=(0, 0, -1))):
        with Locations(Location((-16.7, -80, 0), (0, 0, 90))):
            Circle(SKETCH30_R)
    extrude(amount=-CUT_EXTRUDE17_DEPTH, mode=Mode.SUBTRACT)

    # Fillet10
    fillet10_edges = [body_3.edges().sort_by_distance(p)[0] for p in [
        (5, -72.5, 23.2),
        (5, -76, 26.7),
        (5, -84, 26.7),
        (5, -87.5, 23.2),
        (11.7, -80, 3.2),
    ]]
    fillet(fillet10_edges, radius=FILLET10_R)

    # Sketch31 → Cut-Extrude18 (cut)
    with BuildSketch(Plane(origin=(21.7, 0, 0), x_dir=(0, 0, -1), z_dir=(1, 0, 0))):
        with Locations((-21.796919258, -80)):
            Circle(SKETCH31_R)
    extrude(amount=-CUT_EXTRUDE18_DEPTH, mode=Mode.SUBTRACT)

    # Sketch32 → Cut-Extrude19 (cut)
    with BuildSketch(Plane(origin=(21.7, 0, 0), x_dir=(0, 0, -1), z_dir=(1, 0, 0))):
        with BuildLine():
            Line((-1.387428393, -81.75), (-4.818925736, -81.75))
            ThreePointArc((-4.818925736, -81.75), (-6.568925736, -80), (-4.818925736, -78.25))
            Line((-4.818925736, -78.25), (-1.387428393, -78.25))
            ThreePointArc((-1.387428393, -78.25), (0.362571607, -80), (-1.387428393, -81.75))
        make_face()
    extrude(amount=-CUT_EXTRUDE19_DEPTH, mode=Mode.SUBTRACT)

    # Fillet11
    fillet11_edges = [body_3.edges().sort_by_distance(p)[0] for p in [
        (21.7, -81.75, 4.009462868),
        (21.7, -78.25, 4.009462868),
        (21.7, -80, 6.568925736),
    ]]
    fillet(fillet11_edges, radius=FILLET11_R)


solid = Compound([part.part, body_2.part, body_3.part])
